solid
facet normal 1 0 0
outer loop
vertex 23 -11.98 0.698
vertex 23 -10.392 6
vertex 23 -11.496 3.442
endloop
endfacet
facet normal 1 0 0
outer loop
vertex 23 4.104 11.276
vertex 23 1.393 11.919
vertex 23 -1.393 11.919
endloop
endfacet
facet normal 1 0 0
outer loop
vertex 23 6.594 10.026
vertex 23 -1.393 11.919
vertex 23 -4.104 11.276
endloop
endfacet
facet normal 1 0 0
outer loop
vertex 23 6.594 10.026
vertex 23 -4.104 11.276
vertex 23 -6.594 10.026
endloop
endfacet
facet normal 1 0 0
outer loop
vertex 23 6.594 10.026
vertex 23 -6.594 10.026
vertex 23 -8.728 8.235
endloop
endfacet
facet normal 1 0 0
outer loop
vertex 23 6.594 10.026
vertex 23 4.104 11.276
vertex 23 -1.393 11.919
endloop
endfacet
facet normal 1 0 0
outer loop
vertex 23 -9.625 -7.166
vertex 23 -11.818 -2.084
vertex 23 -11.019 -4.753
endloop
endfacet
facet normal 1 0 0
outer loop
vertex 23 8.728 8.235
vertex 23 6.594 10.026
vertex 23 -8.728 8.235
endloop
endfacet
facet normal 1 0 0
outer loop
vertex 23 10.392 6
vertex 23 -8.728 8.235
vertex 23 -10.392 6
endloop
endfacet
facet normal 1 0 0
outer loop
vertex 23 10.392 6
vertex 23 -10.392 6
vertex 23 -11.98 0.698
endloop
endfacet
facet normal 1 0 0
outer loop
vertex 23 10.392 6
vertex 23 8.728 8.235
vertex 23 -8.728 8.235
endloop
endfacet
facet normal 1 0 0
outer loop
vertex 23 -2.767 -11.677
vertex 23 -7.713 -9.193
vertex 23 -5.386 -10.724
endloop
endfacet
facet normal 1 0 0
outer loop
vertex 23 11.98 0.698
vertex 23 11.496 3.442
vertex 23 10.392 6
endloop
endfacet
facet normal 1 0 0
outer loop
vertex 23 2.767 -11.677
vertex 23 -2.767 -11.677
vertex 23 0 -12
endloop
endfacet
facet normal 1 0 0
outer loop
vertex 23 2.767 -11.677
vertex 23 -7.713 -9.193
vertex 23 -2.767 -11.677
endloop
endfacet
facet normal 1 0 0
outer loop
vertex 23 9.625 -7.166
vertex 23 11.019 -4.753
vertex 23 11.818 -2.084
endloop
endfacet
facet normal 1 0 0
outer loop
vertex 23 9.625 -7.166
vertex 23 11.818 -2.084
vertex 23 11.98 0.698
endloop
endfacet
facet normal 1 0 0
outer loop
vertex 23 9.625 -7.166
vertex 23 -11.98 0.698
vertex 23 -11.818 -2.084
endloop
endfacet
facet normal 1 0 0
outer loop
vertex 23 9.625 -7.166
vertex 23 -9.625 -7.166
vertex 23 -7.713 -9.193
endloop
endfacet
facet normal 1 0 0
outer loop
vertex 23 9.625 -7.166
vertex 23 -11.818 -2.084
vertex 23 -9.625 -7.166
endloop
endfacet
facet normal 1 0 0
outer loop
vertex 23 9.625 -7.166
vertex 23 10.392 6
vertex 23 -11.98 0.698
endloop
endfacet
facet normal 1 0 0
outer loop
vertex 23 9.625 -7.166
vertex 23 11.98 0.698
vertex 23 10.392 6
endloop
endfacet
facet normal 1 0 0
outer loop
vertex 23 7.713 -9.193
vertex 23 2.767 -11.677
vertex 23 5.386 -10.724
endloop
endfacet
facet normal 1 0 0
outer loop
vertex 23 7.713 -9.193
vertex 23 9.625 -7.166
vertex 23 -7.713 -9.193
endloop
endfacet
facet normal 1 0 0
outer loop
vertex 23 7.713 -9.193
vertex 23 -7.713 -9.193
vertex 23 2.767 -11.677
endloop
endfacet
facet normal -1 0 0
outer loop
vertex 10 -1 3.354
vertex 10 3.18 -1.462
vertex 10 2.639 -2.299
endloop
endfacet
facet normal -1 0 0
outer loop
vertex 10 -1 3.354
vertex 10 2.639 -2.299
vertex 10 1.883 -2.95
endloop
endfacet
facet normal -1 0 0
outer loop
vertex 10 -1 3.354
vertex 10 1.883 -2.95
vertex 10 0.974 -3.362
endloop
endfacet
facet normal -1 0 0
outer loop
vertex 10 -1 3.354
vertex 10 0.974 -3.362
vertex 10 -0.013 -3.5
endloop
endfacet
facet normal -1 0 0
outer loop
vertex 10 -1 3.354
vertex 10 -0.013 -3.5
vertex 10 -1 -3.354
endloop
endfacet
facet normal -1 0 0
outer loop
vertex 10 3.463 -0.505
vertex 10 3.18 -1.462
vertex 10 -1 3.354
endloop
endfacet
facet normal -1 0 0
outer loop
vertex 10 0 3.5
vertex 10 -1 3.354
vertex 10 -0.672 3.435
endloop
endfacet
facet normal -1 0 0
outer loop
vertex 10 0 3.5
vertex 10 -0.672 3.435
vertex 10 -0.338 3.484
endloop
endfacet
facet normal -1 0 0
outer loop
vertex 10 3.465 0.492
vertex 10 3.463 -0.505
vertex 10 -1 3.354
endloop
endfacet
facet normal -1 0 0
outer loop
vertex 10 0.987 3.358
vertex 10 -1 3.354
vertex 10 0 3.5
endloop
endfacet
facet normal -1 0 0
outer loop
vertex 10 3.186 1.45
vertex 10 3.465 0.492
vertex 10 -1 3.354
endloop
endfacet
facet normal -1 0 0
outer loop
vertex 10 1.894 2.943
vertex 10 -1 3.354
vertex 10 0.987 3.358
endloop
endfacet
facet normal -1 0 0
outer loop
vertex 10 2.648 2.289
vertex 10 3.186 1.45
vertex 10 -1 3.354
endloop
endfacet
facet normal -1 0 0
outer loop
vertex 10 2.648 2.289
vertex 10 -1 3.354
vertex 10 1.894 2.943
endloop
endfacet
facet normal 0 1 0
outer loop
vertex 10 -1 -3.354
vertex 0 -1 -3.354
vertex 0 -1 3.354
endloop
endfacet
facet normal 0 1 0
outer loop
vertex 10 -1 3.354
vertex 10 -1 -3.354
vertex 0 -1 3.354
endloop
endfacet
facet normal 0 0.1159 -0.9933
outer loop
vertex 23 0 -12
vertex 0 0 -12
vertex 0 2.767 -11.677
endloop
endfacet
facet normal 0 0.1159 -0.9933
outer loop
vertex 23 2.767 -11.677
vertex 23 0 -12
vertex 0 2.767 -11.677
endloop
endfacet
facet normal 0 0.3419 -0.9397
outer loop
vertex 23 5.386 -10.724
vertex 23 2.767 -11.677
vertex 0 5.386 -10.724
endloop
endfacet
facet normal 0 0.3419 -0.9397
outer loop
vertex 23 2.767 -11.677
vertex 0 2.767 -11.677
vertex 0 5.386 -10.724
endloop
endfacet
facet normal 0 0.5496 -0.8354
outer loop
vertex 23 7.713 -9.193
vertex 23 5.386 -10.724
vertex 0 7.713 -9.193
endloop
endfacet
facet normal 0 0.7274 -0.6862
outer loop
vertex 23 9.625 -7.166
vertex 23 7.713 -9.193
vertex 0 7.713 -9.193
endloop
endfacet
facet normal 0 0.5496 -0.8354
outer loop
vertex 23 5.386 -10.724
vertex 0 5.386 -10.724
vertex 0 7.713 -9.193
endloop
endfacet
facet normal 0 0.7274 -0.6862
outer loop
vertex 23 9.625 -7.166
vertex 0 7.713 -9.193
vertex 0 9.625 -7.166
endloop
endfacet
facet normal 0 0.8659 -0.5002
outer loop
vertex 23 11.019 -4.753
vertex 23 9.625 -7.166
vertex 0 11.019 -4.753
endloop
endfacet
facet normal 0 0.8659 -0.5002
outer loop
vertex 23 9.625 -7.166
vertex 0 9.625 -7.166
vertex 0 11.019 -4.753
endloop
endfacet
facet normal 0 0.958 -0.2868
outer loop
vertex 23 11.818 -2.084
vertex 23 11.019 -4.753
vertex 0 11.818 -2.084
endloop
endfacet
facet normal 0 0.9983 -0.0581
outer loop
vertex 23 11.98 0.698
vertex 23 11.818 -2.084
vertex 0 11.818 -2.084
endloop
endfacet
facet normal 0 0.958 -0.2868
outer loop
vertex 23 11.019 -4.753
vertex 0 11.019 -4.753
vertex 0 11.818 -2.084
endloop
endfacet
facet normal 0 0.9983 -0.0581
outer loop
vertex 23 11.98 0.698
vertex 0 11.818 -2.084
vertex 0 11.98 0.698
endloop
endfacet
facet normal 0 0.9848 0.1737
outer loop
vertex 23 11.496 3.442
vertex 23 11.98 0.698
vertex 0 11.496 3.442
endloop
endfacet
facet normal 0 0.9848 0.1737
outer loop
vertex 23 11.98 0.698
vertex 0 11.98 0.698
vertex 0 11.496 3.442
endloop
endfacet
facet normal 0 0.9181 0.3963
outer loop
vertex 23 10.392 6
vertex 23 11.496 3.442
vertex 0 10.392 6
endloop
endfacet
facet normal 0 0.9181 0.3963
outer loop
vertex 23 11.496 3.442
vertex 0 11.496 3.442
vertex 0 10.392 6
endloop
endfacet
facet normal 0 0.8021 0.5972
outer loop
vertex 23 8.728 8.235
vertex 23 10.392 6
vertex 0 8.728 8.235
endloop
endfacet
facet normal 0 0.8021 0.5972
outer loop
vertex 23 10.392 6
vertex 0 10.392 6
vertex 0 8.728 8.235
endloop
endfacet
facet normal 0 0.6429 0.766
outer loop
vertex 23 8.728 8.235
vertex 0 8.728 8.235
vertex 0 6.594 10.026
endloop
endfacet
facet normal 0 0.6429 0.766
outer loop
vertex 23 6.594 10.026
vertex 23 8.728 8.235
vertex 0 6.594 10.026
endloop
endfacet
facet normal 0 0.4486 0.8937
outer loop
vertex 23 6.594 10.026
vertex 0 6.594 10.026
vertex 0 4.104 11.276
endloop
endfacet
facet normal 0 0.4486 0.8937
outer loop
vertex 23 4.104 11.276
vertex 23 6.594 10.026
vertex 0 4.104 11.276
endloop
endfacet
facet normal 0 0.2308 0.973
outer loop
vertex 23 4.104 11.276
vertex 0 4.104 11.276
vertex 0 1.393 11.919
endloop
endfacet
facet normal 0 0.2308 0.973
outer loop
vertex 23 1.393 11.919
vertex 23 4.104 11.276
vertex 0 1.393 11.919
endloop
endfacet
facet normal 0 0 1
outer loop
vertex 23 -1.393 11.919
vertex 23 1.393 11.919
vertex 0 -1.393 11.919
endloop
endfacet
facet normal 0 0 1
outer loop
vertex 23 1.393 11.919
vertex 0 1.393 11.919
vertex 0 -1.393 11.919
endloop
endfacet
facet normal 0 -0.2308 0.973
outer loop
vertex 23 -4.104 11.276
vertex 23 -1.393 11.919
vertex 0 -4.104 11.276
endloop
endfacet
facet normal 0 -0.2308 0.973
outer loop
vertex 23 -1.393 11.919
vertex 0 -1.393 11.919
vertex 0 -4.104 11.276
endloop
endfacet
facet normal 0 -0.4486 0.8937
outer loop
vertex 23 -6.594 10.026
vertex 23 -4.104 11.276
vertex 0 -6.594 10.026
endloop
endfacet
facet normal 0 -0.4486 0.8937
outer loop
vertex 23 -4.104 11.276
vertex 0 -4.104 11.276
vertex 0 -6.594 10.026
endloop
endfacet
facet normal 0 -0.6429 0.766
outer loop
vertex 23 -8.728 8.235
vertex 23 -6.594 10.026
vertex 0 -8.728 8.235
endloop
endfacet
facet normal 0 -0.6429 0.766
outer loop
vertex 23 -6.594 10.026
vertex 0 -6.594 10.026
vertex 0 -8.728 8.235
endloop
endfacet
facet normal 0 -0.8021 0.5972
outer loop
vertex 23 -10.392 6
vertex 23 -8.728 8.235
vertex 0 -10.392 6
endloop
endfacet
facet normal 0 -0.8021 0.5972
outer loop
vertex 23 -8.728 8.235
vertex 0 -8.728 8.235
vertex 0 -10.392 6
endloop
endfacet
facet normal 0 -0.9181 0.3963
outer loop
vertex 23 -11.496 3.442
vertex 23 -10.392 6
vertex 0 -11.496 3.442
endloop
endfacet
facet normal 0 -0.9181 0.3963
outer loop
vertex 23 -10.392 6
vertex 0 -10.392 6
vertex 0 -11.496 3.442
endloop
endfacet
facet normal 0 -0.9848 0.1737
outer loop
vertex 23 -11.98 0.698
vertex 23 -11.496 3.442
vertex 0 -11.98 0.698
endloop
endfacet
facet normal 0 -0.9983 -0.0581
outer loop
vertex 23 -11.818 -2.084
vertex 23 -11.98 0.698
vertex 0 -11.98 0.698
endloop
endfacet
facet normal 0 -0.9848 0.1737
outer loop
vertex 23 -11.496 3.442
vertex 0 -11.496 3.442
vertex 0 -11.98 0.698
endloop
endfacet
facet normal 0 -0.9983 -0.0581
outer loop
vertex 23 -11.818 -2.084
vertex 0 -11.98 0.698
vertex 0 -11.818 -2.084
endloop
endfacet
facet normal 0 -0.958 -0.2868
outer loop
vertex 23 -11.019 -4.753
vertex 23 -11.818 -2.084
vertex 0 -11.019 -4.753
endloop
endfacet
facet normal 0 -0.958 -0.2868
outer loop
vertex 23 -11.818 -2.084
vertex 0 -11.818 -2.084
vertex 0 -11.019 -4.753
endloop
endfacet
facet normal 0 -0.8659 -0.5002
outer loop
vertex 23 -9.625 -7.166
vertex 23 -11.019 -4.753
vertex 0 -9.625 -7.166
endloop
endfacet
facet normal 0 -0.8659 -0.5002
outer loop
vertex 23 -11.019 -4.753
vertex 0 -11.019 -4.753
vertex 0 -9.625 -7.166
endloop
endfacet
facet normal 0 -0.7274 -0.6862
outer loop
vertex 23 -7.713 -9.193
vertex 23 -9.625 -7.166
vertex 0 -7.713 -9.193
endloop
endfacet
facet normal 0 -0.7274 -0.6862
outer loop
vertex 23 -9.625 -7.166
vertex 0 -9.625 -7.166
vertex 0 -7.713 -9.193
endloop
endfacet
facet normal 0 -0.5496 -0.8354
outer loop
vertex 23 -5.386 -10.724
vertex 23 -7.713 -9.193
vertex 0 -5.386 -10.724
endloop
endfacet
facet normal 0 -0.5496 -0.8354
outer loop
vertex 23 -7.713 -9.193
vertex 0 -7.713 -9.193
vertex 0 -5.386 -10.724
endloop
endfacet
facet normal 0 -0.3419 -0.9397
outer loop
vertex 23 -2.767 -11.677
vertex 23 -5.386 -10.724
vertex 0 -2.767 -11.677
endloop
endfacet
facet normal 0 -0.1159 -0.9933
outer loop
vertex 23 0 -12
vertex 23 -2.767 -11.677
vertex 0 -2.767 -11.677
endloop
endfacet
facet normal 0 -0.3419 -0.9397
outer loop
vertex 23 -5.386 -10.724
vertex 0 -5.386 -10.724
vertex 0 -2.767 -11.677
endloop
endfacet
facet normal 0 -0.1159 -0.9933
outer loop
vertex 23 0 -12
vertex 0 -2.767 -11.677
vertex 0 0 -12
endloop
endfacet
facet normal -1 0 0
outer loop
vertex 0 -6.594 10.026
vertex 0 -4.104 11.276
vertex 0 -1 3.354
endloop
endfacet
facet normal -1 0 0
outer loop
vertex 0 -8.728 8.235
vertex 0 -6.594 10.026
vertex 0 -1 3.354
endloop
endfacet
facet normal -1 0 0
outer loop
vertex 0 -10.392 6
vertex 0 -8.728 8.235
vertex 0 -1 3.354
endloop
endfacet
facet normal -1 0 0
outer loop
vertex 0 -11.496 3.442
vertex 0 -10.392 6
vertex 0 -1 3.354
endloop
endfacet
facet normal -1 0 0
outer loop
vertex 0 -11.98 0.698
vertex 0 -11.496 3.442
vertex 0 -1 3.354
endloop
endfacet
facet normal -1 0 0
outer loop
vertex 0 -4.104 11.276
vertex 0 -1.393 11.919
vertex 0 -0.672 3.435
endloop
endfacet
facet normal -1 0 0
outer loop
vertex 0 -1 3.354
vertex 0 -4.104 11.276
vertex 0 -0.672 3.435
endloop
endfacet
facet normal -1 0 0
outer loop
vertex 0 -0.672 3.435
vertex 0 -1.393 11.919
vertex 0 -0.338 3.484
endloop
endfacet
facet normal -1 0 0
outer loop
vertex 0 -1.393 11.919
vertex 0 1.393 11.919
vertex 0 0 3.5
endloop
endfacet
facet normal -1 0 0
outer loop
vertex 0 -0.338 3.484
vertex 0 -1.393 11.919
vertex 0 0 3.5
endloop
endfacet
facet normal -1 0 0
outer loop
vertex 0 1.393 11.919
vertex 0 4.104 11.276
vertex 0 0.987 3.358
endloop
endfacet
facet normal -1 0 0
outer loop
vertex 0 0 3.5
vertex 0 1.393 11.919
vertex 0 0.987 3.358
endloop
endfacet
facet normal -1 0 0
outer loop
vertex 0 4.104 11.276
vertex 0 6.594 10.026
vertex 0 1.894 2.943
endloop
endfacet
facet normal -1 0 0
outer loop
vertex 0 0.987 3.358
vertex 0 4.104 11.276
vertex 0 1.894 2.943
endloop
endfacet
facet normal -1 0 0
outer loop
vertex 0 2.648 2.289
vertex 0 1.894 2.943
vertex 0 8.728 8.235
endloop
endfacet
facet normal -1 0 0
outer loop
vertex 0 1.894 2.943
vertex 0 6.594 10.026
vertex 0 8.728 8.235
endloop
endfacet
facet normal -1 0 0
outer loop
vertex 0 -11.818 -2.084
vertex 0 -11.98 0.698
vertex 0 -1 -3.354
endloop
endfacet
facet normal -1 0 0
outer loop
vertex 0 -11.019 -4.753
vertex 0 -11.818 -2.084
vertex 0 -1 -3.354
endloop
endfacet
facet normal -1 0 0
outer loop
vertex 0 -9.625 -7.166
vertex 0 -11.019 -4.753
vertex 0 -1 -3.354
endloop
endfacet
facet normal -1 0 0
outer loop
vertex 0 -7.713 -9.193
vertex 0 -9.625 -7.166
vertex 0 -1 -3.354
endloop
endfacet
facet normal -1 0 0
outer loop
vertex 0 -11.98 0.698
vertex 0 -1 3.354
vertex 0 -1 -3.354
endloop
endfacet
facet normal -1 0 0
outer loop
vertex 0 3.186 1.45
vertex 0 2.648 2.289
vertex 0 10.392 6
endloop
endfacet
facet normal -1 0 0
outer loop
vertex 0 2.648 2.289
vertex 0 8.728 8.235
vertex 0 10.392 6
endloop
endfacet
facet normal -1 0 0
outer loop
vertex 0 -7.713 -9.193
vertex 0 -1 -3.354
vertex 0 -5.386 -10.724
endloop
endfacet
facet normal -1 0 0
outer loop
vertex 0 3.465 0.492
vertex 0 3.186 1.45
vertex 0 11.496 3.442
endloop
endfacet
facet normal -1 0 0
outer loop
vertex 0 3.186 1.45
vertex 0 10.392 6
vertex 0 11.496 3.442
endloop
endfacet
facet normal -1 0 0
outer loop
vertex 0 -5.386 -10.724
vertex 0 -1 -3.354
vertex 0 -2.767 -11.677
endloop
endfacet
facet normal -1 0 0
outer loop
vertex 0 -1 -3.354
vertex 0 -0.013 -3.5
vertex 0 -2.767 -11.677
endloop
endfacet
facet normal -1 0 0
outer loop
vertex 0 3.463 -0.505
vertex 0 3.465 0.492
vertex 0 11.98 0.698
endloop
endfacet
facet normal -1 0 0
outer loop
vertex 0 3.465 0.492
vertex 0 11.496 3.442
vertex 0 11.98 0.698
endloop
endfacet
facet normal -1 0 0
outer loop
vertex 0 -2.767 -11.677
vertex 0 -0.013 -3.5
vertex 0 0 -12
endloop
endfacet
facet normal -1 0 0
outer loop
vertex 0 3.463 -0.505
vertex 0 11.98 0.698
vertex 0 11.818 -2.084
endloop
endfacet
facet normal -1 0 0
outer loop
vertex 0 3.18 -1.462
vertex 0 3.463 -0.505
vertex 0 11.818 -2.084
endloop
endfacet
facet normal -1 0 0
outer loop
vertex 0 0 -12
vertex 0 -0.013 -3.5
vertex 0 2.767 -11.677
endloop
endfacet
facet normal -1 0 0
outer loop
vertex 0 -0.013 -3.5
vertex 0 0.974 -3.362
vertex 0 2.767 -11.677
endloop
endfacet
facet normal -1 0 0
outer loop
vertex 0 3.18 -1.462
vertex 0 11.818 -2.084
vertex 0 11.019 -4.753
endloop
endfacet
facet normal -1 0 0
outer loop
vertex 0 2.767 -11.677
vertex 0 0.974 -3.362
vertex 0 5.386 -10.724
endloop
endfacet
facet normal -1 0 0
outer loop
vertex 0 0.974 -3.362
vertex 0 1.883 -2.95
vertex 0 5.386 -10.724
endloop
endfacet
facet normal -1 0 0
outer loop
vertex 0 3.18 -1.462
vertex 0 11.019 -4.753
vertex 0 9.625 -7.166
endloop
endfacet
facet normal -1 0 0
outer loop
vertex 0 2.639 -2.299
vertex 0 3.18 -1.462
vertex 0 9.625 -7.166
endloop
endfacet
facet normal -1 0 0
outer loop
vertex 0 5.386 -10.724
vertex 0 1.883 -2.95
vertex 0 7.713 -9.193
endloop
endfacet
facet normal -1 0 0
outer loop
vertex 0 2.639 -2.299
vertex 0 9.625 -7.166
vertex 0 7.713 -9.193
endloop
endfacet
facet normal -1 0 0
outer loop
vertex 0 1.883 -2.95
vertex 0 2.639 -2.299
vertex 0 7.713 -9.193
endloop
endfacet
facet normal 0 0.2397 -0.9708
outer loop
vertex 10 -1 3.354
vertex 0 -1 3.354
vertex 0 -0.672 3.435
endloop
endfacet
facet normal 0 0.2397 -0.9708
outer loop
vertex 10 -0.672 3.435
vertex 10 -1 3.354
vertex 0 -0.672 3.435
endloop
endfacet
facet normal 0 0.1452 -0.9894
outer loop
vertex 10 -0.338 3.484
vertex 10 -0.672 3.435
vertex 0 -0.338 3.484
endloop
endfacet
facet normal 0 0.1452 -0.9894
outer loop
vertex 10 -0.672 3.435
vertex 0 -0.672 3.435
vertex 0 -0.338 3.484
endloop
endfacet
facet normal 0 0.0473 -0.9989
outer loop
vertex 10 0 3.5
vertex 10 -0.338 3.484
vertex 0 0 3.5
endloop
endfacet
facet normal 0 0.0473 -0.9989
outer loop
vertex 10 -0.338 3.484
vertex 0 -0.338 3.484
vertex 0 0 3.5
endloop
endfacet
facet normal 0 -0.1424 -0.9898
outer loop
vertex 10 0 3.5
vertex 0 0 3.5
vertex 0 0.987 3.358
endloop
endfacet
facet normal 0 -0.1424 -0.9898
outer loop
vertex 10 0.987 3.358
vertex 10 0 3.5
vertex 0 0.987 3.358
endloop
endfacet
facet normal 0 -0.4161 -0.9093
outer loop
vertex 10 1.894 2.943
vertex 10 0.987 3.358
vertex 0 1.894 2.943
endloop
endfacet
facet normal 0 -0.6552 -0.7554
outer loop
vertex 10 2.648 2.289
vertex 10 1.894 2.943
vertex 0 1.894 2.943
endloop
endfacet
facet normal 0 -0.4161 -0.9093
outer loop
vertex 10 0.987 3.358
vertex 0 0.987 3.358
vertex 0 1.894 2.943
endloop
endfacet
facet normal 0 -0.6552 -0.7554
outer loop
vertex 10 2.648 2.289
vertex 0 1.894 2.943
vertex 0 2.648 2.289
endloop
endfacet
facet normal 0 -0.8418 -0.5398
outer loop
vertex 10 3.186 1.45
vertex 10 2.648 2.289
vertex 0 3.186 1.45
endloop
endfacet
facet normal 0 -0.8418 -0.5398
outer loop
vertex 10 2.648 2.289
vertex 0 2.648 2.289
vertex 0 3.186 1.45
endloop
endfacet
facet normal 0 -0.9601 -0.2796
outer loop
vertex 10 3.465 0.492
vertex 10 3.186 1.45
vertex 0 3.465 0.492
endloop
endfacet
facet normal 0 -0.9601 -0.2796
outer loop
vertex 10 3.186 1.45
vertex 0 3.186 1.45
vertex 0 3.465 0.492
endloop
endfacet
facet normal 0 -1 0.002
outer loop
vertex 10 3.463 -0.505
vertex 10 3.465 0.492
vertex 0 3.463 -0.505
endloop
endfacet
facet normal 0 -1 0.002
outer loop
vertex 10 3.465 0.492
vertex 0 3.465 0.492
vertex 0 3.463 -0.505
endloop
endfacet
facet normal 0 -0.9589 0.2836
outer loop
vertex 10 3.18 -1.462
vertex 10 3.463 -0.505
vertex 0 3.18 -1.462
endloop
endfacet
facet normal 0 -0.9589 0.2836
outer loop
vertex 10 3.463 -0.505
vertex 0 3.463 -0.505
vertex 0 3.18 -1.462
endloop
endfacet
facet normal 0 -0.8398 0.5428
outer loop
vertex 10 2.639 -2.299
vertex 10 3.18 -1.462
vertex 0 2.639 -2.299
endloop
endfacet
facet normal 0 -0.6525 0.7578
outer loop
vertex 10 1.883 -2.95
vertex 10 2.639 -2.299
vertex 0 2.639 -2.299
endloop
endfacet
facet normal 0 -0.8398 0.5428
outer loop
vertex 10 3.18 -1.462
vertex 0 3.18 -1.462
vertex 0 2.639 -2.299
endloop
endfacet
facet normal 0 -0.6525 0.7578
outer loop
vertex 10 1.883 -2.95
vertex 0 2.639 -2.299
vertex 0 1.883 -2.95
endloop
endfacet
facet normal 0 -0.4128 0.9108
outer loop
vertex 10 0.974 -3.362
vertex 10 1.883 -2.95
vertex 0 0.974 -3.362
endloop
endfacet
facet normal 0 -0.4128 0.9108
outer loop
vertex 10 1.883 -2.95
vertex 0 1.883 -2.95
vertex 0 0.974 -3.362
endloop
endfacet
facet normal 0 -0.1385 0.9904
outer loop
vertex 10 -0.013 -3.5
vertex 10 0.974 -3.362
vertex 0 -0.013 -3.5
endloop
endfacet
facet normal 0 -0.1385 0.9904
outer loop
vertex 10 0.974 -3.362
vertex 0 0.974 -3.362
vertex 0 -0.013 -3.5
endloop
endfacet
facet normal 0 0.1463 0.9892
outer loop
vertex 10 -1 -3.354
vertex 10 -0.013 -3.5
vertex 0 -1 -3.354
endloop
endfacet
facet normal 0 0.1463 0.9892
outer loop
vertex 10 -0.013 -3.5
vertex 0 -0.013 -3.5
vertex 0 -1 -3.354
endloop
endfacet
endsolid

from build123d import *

# Parameters (mm, degrees)
SKETCH1_R           = 12
BOSS_EXTRUDE1_DEPTH = 23
CUT_EXTRUDE1_DEPTH  = 10


with BuildPart() as part:
    # Sketch1 → Boss-Extrude1 (new body)
    with BuildSketch(Plane(origin=(0, 0, 0), x_dir=(0, 0, -1), z_dir=(1, 0, 0))):
        Circle(SKETCH1_R)
    extrude(amount=BOSS_EXTRUDE1_DEPTH)

    # Sketch2 → Cut-Extrude1 (cut)
    with BuildSketch(Plane.ZY):
        with BuildLine():
            ThreePointArc((3.5, 0), (-0.505293538, 3.463333429), (-3.354101966, -1))
            Line((-3.354101966, -1), (3.354101966, -1))
            ThreePointArc((3.354101966, -1), (3.463333429, -0.505293538), (3.5, 0))
        make_face()
    extrude(amount=-CUT_EXTRUDE1_DEPTH, mode=Mode.SUBTRACT)


solid = part.part
